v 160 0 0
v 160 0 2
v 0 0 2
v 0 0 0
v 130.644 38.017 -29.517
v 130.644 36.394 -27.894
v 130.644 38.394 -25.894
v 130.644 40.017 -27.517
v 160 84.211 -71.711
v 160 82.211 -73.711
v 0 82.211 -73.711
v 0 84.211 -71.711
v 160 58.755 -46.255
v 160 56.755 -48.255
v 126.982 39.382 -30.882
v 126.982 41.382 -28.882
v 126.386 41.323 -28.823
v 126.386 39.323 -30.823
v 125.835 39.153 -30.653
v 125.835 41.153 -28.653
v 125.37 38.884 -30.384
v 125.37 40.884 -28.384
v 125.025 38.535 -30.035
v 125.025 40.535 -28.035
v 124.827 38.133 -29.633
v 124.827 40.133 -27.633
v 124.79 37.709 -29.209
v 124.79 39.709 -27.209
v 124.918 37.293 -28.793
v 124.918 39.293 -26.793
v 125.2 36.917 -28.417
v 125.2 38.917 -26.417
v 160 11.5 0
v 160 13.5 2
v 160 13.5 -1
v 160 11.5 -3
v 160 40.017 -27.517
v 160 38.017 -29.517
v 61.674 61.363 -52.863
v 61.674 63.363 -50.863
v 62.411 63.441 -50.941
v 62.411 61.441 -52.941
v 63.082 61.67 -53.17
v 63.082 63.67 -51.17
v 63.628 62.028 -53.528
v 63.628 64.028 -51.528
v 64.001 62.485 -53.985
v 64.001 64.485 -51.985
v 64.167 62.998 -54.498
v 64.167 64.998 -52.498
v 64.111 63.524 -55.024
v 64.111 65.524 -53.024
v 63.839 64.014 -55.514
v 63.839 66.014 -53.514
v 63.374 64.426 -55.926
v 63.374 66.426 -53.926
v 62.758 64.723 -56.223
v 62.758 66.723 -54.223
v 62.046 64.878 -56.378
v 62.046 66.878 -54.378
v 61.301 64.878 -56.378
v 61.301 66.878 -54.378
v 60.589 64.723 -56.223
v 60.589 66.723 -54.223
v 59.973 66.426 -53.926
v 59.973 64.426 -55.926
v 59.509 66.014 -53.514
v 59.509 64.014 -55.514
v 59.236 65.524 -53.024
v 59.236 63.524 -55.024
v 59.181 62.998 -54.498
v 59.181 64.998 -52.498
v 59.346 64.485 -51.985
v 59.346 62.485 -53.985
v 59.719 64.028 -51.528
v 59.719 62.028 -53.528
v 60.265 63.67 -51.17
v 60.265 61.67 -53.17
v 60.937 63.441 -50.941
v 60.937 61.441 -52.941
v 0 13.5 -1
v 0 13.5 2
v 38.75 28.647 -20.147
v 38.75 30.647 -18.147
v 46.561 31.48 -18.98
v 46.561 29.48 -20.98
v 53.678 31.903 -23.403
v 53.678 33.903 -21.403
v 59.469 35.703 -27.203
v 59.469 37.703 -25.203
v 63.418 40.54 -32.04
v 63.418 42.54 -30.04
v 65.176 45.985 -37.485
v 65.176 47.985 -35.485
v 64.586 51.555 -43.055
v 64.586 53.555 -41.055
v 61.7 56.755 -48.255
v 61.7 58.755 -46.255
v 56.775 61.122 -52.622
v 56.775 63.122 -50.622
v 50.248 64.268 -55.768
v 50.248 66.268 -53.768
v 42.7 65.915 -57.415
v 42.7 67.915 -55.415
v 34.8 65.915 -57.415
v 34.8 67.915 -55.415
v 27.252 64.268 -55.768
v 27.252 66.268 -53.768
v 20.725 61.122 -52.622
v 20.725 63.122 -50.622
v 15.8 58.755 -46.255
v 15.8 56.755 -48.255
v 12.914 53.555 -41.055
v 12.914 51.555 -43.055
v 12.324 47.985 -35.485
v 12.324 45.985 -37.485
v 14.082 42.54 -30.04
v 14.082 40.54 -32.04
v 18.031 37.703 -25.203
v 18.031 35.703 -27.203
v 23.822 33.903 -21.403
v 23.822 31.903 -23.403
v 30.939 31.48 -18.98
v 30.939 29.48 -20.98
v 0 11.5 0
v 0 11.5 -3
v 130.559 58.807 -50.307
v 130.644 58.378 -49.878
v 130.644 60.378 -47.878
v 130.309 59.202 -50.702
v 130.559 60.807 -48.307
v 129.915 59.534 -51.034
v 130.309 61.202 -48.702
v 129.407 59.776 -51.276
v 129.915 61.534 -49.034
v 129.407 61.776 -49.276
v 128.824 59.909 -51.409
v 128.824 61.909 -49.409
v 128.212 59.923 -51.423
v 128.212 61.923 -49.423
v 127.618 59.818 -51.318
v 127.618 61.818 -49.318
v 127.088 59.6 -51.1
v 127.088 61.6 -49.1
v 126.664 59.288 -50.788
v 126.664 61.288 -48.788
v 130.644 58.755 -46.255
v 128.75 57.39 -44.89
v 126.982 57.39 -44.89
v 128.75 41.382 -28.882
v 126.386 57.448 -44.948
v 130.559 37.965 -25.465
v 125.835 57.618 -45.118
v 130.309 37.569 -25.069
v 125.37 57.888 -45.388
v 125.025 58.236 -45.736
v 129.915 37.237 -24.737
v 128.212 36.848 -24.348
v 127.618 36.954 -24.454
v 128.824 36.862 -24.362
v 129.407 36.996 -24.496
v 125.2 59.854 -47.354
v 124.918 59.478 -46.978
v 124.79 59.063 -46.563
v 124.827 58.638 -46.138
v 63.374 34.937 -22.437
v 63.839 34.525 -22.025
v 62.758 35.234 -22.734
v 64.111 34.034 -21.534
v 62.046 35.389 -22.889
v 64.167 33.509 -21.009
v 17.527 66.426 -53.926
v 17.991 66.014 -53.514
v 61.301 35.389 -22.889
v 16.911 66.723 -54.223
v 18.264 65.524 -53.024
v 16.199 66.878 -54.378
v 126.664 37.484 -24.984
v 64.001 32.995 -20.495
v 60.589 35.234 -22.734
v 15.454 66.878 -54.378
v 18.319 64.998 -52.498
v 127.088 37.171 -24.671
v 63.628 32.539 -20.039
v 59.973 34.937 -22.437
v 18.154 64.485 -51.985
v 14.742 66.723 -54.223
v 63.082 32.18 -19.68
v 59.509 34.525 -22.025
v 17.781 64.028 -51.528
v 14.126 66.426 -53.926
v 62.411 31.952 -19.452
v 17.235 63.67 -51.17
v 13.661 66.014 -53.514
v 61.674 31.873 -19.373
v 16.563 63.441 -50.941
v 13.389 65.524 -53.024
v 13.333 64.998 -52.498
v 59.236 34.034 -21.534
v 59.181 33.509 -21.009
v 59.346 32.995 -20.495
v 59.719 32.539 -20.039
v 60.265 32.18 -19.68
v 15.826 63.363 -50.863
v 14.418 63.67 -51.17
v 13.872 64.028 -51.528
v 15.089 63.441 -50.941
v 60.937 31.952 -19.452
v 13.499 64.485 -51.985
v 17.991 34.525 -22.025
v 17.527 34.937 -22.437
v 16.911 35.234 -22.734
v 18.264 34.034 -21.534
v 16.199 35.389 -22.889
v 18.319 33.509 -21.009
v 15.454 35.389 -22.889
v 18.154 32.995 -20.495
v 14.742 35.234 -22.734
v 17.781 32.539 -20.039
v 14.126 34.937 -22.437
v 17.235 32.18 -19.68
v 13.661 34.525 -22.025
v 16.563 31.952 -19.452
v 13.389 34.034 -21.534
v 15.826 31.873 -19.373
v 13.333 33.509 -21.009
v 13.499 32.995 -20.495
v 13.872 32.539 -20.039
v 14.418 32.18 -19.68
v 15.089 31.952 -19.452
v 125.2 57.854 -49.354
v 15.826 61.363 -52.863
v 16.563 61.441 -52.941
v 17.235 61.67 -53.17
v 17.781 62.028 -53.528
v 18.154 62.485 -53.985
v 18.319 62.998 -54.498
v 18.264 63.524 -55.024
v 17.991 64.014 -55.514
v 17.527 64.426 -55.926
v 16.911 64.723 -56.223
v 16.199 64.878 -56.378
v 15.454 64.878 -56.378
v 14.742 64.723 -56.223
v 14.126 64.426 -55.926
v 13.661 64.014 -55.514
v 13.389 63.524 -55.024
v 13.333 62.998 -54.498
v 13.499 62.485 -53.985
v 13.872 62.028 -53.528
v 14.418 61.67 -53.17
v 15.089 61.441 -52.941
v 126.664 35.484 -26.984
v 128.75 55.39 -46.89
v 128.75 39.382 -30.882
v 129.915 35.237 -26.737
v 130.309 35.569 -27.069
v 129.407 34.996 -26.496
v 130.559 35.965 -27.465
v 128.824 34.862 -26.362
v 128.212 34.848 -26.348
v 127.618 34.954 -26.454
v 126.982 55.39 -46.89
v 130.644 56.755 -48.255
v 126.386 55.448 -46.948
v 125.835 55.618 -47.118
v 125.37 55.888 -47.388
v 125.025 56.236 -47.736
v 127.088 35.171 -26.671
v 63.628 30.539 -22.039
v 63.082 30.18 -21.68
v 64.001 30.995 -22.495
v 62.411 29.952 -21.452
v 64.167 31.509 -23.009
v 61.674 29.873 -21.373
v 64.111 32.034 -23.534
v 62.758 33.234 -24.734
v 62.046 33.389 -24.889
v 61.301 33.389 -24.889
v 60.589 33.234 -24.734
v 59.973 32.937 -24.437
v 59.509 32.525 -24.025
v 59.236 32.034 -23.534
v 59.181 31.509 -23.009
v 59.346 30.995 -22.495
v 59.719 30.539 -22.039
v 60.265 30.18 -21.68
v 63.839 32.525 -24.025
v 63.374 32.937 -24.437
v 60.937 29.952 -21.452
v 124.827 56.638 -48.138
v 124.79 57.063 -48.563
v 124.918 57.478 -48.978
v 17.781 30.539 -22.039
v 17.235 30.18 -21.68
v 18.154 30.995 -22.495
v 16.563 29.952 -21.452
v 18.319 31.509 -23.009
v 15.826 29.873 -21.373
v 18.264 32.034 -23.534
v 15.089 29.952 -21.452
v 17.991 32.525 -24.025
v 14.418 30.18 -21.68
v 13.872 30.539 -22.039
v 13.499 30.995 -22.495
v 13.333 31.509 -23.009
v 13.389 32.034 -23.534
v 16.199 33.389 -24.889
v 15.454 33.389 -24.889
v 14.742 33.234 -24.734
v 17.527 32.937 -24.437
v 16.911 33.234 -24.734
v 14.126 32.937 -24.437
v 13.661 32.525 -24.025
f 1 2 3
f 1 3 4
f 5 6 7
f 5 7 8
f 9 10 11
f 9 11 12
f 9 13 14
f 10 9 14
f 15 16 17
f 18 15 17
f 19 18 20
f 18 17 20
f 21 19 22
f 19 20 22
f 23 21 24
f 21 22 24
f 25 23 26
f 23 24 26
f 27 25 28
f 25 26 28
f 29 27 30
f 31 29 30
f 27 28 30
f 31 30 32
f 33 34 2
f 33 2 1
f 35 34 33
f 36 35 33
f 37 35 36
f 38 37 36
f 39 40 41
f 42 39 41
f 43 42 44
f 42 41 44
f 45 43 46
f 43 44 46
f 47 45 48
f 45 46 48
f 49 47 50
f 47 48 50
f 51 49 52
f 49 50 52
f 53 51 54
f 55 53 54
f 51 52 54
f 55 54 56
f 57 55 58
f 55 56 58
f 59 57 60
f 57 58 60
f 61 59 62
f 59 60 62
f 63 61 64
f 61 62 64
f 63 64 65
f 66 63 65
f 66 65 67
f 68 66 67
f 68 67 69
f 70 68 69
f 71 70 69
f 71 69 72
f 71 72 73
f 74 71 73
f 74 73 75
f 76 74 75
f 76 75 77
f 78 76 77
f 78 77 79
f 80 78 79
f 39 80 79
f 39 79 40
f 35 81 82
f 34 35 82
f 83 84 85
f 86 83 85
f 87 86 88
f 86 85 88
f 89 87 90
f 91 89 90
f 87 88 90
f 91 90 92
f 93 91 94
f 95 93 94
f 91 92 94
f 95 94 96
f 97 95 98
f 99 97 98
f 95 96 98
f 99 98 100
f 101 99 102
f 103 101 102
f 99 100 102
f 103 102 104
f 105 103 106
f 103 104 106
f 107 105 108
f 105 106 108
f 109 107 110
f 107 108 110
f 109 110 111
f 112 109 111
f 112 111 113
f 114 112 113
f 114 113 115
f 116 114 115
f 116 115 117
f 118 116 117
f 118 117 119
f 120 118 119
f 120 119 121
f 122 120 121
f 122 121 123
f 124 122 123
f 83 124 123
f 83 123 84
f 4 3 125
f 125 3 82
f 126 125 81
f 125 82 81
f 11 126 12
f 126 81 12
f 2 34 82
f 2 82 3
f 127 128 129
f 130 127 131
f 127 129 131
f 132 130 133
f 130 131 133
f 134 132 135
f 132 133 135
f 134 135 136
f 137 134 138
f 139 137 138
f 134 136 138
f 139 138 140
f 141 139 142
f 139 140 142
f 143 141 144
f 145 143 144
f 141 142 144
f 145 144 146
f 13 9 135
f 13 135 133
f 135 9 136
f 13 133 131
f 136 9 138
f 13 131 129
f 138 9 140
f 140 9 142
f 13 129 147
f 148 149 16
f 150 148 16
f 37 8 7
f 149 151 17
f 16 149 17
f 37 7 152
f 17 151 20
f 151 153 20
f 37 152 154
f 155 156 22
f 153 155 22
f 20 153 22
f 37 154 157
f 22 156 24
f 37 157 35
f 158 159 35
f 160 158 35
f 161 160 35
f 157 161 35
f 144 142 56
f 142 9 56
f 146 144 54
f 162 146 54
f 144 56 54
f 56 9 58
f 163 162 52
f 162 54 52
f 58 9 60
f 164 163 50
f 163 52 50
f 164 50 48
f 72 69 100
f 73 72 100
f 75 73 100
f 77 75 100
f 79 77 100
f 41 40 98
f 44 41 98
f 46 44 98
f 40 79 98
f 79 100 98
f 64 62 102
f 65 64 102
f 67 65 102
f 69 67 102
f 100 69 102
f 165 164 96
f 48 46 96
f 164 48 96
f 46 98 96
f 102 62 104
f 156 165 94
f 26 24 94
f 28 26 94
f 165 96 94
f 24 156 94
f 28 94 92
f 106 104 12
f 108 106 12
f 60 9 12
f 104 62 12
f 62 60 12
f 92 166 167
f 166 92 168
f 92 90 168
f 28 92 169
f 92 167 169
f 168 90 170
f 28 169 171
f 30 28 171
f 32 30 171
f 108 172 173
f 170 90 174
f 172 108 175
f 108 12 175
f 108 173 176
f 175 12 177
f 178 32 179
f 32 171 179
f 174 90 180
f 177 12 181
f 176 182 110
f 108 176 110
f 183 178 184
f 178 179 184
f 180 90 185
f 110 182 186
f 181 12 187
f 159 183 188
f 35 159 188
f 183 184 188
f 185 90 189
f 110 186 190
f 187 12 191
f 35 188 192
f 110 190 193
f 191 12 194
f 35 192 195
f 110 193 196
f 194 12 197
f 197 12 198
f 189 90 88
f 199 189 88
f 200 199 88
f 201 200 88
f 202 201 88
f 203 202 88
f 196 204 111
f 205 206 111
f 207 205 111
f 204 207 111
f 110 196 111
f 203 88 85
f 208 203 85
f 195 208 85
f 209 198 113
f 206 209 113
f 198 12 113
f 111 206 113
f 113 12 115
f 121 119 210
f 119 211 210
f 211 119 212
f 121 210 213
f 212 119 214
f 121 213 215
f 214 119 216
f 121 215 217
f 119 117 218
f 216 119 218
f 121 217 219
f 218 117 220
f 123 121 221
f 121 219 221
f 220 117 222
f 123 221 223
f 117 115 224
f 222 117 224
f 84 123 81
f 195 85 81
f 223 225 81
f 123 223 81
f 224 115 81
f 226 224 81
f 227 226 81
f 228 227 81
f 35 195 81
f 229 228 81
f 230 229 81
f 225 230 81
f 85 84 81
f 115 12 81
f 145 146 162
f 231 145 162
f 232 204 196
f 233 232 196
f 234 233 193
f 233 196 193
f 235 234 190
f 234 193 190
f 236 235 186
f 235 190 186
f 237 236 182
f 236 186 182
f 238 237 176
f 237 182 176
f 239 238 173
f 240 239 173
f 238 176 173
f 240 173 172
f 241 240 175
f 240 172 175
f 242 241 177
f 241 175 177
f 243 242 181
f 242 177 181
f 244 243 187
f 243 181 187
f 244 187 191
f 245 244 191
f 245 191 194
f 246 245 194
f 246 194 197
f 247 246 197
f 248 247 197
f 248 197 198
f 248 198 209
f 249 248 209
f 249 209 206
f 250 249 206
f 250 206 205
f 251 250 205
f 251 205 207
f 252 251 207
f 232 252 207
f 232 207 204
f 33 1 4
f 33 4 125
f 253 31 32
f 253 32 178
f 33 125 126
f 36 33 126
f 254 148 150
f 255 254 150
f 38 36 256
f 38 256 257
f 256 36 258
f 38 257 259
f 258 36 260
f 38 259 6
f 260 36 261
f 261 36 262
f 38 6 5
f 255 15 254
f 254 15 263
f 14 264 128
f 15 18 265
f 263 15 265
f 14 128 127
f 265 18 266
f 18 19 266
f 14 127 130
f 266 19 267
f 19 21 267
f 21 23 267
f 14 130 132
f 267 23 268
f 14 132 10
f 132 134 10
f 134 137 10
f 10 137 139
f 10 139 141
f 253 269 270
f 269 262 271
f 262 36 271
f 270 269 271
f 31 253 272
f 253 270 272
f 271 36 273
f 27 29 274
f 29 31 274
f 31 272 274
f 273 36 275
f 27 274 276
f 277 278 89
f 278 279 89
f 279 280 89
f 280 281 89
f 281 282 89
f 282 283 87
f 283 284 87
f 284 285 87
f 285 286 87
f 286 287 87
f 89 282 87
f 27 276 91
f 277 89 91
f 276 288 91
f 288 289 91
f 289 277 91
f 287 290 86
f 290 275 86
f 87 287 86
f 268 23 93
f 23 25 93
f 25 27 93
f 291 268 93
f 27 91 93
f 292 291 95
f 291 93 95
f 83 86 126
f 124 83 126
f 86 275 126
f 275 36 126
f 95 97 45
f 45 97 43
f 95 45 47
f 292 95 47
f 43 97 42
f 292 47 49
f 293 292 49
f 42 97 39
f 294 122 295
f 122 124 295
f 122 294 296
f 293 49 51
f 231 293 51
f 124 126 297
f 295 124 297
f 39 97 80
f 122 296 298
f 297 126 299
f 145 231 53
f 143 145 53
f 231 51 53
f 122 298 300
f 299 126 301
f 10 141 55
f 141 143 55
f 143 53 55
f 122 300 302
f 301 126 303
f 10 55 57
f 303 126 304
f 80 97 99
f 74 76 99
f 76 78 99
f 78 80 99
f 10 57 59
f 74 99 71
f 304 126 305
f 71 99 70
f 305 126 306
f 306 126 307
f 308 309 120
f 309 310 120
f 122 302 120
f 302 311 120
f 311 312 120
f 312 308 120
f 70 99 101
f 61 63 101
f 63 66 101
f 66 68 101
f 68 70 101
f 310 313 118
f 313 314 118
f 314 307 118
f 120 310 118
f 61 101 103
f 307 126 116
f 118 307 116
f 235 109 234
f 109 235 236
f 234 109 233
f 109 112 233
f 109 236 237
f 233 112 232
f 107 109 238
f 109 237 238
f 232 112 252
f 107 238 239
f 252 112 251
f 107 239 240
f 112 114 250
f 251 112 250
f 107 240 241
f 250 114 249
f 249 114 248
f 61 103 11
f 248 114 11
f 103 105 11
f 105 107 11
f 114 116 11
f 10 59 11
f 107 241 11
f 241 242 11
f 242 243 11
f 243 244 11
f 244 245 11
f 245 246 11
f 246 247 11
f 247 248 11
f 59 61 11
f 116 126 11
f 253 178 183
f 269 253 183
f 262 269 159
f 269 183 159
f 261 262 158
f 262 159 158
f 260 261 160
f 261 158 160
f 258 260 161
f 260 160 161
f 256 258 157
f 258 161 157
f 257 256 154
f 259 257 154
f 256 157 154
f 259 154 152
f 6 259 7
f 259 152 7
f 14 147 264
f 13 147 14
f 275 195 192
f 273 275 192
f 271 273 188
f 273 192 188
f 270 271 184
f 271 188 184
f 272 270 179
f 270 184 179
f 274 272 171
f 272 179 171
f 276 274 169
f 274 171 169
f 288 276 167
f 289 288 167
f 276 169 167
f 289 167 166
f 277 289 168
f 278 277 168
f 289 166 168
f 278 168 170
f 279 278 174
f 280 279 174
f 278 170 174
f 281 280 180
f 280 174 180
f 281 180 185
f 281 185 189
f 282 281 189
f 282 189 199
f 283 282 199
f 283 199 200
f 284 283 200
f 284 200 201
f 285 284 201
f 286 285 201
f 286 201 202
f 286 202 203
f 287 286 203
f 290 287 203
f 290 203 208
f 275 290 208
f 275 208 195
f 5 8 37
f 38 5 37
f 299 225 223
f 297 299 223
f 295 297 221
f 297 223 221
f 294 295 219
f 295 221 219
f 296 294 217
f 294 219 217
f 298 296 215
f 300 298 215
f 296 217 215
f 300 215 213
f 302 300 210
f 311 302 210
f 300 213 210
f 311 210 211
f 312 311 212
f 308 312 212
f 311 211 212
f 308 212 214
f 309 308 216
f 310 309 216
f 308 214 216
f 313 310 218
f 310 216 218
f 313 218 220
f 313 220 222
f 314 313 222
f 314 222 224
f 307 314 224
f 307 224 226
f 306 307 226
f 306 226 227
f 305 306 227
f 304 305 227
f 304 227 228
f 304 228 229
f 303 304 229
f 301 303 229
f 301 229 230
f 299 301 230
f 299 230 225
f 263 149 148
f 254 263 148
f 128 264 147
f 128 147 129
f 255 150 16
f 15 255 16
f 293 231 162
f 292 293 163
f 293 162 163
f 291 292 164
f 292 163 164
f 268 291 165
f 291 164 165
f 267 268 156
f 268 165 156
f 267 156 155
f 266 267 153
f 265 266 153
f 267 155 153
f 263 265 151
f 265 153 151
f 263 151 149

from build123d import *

# Parameters (mm, degrees)
BOSS_EXTRUDE1_DEPTH = 160
BOSS_EXTRUDE2_DEPTH = 160
SKETCH4_W           = 31.25
SKETCH4_H           = 14
SKETCH4_H_2         = 12.5
CUT_EXTRUDE1_DEPTH  = 10
CUT_EXTRUDE2_DEPTH  = 10
SKETCH6_R           = 26.5
CUT_EXTRUDE3_DEPTH  = 10
SKETCH7_R           = 2.5
CUT_EXTRUDE4_DEPTH  = 10


with BuildPart() as part:
    # Sketch1 → Boss-Extrude1 (new body)
    with BuildSketch(Plane(origin=(0, 0, 0), x_dir=(0, 0, -1), z_dir=(1, 0, 0))):
        Polygon((0, 0), (0, 11.5), (3, 11.5), (3, 13.5), (-2, 13.5), (-2, 0), align=None)
    extrude(amount=BOSS_EXTRUDE1_DEPTH)

    # Sketch2 → Boss-Extrude2 (add)
    with BuildSketch(Plane(origin=(0, 0, 0), x_dir=(0, 0, -1), z_dir=(1, 0, 0))):
        Polygon((3, 13.5), (3, 11.5), (24.213203436, 32.713203436), (73.710678119, 82.210678119), (71.710678119, 84.210678119), (22.213203436, 34.713203436), (1, 13.5), align=None)
    extrude(amount=BOSS_EXTRUDE2_DEPTH)

    # Sketch4 → Cut-Extrude1 (cut)
    with BuildSketch(Plane(origin=(0, 6.25, 6.25), x_dir=(1, 0, 0), z_dir=(0, 0.7071067811865477, 0.7071067811865475))):
        with Locations((144.375, 67.253048327)):
            Rectangle(SKETCH4_W, SKETCH4_H)
        with Locations((144.375, 54.003048327)):
            Rectangle(SKETCH4_W, SKETCH4_H_2)
    extrude(amount=-CUT_EXTRUDE1_DEPTH, mode=Mode.SUBTRACT)

    # Sketch5 → Cut-Extrude2 (cut)
    with BuildSketch(Plane(origin=(0, 6.25, 6.25), x_dir=(1, 0, 0), z_dir=(0, 0.7071067811865477, 0.7071067811865475))):
        with BuildLine():
            Line((128.75, 74.253048327), (130.644024073, 74.253048327))
            Line((130.644024073, 74.253048327), (130.644024073, 76.548206166))
            ThreePointArc((130.644024073, 76.548206166), (129.12196275, 78.639811919), (126.663600689, 77.834863927))
            Line((126.663600689, 77.834863927), (125.199975137, 75.807473041))
            ThreePointArc((125.199975137, 75.807473041), (125.025166605, 73.519904499), (126.982233047, 72.322649807))
            Line((126.982233047, 72.322649807), (128.75, 72.322649807))
            Line((128.75, 72.322649807), (128.75, 74.253048327))
        make_face()
        with BuildLine():
            Line((128.75, 49.683446848), (126.982233047, 49.683446848))
            ThreePointArc((126.982233047, 49.683446848), (125.025166605, 48.486192156), (125.199975137, 46.198623614))
            Line((125.199975137, 46.198623614), (126.663600689, 44.171232728))
            ThreePointArc((126.663600689, 44.171232728), (129.12196275, 43.366284735), (130.644024073, 45.457890488))
            Line((130.644024073, 45.457890488), (130.644024073, 47.753048327))
            Line((130.644024073, 47.753048327), (128.75, 47.753048327))
            Line((128.75, 47.753048327), (128.75, 49.683446848))
        make_face()
    extrude(amount=-CUT_EXTRUDE2_DEPTH, mode=Mode.SUBTRACT)

    # Sketch6 → Cut-Extrude3 (cut)
    with BuildSketch(Plane(origin=(0, 6.25, 6.25), x_dir=(1, 0, 0), z_dir=(0, 0.7071067811865477, 0.7071067811865475))):
        with Locations(Location((38.75, 61.003048327, 0), (0, 0, 270))):
            Circle(SKETCH6_R)
    extrude(amount=-CUT_EXTRUDE3_DEPTH, mode=Mode.SUBTRACT)

    # Sketch7 → Cut-Extrude4 (cut)
    with BuildSketch(Plane(origin=(0, 6.25, 6.25), x_dir=(1, 0, 0), z_dir=(0, 0.7071067811865477, 0.7071067811865475))):
        with Locations(Location((15.82638188, 83.269496377, 0), (0, 0, 270))):
            Circle(SKETCH7_R)
        with Locations(Location((15.82638188, 38.736600277, 0), (0, 0, 270))):
            Circle(SKETCH7_R)
        with Locations(Location((61.67361812, 38.736600277, 0), (0, 0, 270))):
            Circle(SKETCH7_R)
        with Locations(Location((61.67361812, 83.269496377, 0), (0, 0, 270))):
            Circle(SKETCH7_R)
    extrude(amount=-CUT_EXTRUDE4_DEPTH, mode=Mode.SUBTRACT)


solid = part.part
